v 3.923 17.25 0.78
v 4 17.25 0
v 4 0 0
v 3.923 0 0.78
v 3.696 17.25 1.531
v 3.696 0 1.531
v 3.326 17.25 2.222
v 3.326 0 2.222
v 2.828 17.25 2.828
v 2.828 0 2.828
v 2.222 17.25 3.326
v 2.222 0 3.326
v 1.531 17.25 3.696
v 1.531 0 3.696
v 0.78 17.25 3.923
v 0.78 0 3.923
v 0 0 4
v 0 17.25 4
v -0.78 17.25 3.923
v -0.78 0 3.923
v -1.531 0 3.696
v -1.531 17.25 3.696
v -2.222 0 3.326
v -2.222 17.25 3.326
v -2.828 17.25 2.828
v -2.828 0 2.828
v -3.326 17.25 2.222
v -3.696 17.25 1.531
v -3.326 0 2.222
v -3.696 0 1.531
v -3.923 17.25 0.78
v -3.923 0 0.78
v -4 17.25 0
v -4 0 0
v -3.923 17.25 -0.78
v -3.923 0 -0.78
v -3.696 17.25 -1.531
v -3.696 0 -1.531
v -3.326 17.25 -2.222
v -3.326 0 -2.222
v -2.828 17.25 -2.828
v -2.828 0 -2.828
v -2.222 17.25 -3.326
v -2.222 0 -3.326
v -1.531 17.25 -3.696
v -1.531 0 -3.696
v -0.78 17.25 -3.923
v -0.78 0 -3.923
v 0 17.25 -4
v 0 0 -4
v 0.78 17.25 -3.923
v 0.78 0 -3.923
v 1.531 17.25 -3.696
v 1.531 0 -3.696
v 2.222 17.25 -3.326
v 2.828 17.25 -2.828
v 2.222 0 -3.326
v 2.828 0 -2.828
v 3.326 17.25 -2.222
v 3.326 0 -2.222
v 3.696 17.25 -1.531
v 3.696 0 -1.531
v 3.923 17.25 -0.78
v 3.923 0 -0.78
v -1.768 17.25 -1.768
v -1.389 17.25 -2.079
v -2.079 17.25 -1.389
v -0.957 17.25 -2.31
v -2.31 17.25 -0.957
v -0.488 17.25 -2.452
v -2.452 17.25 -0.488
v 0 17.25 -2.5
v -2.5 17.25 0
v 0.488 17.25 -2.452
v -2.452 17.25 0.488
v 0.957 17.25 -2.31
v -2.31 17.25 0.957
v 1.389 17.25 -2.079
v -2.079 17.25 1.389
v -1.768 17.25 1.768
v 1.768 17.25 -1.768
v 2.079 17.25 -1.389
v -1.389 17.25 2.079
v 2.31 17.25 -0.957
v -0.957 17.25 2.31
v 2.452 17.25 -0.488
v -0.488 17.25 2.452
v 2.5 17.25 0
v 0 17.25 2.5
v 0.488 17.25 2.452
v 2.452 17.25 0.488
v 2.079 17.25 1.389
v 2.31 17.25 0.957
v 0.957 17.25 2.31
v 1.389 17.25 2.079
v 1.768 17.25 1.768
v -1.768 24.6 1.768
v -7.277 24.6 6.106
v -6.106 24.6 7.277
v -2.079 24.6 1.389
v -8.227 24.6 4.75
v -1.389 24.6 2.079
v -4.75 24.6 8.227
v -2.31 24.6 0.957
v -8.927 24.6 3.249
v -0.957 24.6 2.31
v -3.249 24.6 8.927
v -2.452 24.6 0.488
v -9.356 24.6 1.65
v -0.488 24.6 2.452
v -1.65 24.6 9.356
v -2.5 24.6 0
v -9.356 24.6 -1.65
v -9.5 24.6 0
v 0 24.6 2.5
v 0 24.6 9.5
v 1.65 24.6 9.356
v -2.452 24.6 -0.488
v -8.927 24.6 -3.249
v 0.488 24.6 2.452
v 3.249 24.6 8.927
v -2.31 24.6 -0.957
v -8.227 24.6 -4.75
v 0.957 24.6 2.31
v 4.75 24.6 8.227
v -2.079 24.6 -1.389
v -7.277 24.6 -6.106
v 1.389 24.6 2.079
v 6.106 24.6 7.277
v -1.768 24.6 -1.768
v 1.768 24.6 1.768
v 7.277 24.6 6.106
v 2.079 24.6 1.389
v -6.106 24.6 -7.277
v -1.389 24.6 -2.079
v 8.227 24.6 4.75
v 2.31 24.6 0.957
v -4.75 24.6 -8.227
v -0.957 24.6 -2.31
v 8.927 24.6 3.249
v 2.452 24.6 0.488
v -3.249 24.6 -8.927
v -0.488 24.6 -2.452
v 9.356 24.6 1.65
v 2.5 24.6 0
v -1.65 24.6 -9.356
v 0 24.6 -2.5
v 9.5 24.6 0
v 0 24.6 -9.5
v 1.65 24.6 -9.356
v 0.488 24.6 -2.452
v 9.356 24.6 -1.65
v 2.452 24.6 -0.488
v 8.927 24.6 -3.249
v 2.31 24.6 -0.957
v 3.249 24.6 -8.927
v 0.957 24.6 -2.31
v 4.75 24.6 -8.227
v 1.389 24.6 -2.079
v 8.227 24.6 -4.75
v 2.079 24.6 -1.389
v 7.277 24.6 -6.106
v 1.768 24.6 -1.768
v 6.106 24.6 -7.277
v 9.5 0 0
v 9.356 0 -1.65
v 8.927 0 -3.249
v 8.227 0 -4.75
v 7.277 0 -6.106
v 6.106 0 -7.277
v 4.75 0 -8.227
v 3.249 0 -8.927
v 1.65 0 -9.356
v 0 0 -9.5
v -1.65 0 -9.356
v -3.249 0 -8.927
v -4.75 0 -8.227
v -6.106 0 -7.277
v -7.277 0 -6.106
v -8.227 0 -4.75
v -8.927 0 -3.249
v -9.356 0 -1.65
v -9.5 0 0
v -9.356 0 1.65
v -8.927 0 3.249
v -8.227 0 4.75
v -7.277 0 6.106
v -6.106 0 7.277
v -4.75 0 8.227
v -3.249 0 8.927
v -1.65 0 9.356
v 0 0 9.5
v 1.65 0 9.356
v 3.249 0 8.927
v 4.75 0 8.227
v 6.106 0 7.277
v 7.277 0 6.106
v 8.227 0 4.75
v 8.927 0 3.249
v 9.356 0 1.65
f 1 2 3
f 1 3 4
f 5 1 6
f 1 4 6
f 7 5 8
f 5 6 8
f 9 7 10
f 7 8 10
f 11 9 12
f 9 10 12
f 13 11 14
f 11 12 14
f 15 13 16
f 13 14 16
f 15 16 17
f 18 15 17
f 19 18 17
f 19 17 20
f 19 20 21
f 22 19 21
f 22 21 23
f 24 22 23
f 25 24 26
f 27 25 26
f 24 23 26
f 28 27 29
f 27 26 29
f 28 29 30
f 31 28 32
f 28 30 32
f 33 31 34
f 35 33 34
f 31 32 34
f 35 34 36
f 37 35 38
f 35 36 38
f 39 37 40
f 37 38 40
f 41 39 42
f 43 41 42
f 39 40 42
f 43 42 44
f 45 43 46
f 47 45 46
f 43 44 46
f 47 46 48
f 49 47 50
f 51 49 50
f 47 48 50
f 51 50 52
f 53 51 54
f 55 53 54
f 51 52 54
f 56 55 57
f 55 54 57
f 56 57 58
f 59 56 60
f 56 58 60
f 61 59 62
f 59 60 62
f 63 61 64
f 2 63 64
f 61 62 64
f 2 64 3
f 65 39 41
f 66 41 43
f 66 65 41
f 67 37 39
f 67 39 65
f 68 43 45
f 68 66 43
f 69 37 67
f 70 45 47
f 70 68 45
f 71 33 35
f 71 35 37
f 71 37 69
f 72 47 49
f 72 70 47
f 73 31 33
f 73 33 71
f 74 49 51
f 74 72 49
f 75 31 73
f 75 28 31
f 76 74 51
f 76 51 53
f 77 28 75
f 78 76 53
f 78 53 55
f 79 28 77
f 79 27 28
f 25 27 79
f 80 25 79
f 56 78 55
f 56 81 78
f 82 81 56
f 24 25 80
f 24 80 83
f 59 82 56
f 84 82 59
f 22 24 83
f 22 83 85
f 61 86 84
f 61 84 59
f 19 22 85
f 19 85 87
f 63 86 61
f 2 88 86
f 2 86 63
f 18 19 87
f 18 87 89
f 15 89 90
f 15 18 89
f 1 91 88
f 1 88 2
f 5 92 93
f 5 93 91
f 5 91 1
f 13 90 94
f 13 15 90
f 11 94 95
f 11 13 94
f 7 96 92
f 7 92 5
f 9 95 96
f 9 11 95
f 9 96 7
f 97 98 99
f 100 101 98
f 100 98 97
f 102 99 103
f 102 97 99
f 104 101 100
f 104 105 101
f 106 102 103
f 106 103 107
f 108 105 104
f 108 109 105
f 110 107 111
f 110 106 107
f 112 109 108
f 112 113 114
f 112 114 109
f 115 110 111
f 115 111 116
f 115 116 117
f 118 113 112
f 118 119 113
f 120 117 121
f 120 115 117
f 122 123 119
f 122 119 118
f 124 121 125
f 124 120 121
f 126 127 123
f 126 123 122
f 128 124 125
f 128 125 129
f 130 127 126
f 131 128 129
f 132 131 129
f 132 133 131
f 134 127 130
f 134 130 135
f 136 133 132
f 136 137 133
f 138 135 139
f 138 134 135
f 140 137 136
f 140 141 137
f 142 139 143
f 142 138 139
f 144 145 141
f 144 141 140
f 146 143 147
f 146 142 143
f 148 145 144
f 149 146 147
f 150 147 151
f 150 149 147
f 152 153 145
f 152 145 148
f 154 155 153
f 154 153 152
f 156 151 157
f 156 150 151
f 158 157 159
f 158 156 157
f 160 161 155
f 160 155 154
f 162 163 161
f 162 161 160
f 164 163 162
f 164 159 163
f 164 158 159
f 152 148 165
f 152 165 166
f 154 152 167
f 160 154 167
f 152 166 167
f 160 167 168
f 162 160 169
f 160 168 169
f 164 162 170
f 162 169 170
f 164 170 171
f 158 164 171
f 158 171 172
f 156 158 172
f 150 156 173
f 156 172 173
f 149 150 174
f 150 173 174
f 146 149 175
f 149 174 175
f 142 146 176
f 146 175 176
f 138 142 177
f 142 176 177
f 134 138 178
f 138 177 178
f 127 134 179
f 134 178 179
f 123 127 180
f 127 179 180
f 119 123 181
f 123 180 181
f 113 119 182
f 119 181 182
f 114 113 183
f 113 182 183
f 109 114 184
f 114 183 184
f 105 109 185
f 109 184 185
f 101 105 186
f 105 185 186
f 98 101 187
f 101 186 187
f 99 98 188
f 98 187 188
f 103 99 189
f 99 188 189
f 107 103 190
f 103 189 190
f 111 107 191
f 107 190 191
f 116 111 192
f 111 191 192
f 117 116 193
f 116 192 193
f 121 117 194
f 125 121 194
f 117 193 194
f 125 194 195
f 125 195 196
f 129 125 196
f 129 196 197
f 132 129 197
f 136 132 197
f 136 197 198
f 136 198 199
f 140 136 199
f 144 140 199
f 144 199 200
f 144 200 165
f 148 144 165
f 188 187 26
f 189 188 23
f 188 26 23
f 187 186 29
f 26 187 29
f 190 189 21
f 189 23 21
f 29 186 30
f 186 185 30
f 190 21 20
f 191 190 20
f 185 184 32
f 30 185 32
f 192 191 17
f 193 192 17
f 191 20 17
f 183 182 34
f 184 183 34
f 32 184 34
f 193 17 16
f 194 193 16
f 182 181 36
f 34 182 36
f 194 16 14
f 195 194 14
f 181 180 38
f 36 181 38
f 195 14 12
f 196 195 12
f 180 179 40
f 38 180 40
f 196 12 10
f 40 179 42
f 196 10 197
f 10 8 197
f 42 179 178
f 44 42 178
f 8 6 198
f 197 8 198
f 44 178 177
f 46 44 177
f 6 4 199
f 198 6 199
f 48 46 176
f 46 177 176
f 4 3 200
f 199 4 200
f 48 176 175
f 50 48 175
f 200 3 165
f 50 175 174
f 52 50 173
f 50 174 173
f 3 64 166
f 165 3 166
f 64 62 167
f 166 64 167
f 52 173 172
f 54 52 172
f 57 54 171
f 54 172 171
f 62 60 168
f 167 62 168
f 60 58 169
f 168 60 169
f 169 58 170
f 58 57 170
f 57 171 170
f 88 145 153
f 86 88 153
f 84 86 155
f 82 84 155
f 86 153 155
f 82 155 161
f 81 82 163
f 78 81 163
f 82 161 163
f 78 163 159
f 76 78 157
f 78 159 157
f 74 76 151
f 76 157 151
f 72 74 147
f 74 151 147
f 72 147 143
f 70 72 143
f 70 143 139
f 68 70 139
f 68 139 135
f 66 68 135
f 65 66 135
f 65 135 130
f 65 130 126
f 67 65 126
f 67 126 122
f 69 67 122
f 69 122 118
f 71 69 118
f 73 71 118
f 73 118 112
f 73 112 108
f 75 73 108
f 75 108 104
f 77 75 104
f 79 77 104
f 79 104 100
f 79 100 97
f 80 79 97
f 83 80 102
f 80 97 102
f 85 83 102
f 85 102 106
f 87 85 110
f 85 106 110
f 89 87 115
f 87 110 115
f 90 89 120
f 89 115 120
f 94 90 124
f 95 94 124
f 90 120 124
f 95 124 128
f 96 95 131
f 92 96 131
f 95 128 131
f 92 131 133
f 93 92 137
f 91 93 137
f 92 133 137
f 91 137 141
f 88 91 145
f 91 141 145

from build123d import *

# Parameters (mm, degrees)
SKETCH1_R           = 9.5
COUPLING_BODY_DEPTH = 24.6
F_5MM_HOLE_REACH    = 26.6
SKETCH2_R           = 2.5
SKETCH3_R           = 4
F_8_MM_HOLE_DEPTH   = 17.25


with BuildPart() as part:
    # Sketch1 → coupling body (new body)
    with BuildSketch(Plane(origin=(0, 0, 0), x_dir=(1, 0, 0), z_dir=(0, 1, 0))):
        Circle(SKETCH1_R)
    extrude(amount=COUPLING_BODY_DEPTH)

    # Sketch2 → 5mm hole (cut, up to next)
    with BuildSketch(Plane(origin=(0, 24.6, 0), x_dir=(1, 0, 0), z_dir=(0, 1, 0)), mode=Mode.PRIVATE) as f_5mm_hole_sk1:
        Circle(SKETCH2_R)
    f_5mm_hole_tool1 = extrude(f_5mm_hole_sk1.sketch, amount=-F_5MM_HOLE_REACH, mode=Mode.PRIVATE) & part.part
    add(f_5mm_hole_tool1.solids().sort_by_distance((0, 24.6, 0))[0], mode=Mode.SUBTRACT)

    # Sketch3 → 8 mm hole (cut)
    with BuildSketch(Plane.XZ):
        Circle(SKETCH3_R)
    extrude(amount=-F_8_MM_HOLE_DEPTH, mode=Mode.SUBTRACT)


solid = part.part
